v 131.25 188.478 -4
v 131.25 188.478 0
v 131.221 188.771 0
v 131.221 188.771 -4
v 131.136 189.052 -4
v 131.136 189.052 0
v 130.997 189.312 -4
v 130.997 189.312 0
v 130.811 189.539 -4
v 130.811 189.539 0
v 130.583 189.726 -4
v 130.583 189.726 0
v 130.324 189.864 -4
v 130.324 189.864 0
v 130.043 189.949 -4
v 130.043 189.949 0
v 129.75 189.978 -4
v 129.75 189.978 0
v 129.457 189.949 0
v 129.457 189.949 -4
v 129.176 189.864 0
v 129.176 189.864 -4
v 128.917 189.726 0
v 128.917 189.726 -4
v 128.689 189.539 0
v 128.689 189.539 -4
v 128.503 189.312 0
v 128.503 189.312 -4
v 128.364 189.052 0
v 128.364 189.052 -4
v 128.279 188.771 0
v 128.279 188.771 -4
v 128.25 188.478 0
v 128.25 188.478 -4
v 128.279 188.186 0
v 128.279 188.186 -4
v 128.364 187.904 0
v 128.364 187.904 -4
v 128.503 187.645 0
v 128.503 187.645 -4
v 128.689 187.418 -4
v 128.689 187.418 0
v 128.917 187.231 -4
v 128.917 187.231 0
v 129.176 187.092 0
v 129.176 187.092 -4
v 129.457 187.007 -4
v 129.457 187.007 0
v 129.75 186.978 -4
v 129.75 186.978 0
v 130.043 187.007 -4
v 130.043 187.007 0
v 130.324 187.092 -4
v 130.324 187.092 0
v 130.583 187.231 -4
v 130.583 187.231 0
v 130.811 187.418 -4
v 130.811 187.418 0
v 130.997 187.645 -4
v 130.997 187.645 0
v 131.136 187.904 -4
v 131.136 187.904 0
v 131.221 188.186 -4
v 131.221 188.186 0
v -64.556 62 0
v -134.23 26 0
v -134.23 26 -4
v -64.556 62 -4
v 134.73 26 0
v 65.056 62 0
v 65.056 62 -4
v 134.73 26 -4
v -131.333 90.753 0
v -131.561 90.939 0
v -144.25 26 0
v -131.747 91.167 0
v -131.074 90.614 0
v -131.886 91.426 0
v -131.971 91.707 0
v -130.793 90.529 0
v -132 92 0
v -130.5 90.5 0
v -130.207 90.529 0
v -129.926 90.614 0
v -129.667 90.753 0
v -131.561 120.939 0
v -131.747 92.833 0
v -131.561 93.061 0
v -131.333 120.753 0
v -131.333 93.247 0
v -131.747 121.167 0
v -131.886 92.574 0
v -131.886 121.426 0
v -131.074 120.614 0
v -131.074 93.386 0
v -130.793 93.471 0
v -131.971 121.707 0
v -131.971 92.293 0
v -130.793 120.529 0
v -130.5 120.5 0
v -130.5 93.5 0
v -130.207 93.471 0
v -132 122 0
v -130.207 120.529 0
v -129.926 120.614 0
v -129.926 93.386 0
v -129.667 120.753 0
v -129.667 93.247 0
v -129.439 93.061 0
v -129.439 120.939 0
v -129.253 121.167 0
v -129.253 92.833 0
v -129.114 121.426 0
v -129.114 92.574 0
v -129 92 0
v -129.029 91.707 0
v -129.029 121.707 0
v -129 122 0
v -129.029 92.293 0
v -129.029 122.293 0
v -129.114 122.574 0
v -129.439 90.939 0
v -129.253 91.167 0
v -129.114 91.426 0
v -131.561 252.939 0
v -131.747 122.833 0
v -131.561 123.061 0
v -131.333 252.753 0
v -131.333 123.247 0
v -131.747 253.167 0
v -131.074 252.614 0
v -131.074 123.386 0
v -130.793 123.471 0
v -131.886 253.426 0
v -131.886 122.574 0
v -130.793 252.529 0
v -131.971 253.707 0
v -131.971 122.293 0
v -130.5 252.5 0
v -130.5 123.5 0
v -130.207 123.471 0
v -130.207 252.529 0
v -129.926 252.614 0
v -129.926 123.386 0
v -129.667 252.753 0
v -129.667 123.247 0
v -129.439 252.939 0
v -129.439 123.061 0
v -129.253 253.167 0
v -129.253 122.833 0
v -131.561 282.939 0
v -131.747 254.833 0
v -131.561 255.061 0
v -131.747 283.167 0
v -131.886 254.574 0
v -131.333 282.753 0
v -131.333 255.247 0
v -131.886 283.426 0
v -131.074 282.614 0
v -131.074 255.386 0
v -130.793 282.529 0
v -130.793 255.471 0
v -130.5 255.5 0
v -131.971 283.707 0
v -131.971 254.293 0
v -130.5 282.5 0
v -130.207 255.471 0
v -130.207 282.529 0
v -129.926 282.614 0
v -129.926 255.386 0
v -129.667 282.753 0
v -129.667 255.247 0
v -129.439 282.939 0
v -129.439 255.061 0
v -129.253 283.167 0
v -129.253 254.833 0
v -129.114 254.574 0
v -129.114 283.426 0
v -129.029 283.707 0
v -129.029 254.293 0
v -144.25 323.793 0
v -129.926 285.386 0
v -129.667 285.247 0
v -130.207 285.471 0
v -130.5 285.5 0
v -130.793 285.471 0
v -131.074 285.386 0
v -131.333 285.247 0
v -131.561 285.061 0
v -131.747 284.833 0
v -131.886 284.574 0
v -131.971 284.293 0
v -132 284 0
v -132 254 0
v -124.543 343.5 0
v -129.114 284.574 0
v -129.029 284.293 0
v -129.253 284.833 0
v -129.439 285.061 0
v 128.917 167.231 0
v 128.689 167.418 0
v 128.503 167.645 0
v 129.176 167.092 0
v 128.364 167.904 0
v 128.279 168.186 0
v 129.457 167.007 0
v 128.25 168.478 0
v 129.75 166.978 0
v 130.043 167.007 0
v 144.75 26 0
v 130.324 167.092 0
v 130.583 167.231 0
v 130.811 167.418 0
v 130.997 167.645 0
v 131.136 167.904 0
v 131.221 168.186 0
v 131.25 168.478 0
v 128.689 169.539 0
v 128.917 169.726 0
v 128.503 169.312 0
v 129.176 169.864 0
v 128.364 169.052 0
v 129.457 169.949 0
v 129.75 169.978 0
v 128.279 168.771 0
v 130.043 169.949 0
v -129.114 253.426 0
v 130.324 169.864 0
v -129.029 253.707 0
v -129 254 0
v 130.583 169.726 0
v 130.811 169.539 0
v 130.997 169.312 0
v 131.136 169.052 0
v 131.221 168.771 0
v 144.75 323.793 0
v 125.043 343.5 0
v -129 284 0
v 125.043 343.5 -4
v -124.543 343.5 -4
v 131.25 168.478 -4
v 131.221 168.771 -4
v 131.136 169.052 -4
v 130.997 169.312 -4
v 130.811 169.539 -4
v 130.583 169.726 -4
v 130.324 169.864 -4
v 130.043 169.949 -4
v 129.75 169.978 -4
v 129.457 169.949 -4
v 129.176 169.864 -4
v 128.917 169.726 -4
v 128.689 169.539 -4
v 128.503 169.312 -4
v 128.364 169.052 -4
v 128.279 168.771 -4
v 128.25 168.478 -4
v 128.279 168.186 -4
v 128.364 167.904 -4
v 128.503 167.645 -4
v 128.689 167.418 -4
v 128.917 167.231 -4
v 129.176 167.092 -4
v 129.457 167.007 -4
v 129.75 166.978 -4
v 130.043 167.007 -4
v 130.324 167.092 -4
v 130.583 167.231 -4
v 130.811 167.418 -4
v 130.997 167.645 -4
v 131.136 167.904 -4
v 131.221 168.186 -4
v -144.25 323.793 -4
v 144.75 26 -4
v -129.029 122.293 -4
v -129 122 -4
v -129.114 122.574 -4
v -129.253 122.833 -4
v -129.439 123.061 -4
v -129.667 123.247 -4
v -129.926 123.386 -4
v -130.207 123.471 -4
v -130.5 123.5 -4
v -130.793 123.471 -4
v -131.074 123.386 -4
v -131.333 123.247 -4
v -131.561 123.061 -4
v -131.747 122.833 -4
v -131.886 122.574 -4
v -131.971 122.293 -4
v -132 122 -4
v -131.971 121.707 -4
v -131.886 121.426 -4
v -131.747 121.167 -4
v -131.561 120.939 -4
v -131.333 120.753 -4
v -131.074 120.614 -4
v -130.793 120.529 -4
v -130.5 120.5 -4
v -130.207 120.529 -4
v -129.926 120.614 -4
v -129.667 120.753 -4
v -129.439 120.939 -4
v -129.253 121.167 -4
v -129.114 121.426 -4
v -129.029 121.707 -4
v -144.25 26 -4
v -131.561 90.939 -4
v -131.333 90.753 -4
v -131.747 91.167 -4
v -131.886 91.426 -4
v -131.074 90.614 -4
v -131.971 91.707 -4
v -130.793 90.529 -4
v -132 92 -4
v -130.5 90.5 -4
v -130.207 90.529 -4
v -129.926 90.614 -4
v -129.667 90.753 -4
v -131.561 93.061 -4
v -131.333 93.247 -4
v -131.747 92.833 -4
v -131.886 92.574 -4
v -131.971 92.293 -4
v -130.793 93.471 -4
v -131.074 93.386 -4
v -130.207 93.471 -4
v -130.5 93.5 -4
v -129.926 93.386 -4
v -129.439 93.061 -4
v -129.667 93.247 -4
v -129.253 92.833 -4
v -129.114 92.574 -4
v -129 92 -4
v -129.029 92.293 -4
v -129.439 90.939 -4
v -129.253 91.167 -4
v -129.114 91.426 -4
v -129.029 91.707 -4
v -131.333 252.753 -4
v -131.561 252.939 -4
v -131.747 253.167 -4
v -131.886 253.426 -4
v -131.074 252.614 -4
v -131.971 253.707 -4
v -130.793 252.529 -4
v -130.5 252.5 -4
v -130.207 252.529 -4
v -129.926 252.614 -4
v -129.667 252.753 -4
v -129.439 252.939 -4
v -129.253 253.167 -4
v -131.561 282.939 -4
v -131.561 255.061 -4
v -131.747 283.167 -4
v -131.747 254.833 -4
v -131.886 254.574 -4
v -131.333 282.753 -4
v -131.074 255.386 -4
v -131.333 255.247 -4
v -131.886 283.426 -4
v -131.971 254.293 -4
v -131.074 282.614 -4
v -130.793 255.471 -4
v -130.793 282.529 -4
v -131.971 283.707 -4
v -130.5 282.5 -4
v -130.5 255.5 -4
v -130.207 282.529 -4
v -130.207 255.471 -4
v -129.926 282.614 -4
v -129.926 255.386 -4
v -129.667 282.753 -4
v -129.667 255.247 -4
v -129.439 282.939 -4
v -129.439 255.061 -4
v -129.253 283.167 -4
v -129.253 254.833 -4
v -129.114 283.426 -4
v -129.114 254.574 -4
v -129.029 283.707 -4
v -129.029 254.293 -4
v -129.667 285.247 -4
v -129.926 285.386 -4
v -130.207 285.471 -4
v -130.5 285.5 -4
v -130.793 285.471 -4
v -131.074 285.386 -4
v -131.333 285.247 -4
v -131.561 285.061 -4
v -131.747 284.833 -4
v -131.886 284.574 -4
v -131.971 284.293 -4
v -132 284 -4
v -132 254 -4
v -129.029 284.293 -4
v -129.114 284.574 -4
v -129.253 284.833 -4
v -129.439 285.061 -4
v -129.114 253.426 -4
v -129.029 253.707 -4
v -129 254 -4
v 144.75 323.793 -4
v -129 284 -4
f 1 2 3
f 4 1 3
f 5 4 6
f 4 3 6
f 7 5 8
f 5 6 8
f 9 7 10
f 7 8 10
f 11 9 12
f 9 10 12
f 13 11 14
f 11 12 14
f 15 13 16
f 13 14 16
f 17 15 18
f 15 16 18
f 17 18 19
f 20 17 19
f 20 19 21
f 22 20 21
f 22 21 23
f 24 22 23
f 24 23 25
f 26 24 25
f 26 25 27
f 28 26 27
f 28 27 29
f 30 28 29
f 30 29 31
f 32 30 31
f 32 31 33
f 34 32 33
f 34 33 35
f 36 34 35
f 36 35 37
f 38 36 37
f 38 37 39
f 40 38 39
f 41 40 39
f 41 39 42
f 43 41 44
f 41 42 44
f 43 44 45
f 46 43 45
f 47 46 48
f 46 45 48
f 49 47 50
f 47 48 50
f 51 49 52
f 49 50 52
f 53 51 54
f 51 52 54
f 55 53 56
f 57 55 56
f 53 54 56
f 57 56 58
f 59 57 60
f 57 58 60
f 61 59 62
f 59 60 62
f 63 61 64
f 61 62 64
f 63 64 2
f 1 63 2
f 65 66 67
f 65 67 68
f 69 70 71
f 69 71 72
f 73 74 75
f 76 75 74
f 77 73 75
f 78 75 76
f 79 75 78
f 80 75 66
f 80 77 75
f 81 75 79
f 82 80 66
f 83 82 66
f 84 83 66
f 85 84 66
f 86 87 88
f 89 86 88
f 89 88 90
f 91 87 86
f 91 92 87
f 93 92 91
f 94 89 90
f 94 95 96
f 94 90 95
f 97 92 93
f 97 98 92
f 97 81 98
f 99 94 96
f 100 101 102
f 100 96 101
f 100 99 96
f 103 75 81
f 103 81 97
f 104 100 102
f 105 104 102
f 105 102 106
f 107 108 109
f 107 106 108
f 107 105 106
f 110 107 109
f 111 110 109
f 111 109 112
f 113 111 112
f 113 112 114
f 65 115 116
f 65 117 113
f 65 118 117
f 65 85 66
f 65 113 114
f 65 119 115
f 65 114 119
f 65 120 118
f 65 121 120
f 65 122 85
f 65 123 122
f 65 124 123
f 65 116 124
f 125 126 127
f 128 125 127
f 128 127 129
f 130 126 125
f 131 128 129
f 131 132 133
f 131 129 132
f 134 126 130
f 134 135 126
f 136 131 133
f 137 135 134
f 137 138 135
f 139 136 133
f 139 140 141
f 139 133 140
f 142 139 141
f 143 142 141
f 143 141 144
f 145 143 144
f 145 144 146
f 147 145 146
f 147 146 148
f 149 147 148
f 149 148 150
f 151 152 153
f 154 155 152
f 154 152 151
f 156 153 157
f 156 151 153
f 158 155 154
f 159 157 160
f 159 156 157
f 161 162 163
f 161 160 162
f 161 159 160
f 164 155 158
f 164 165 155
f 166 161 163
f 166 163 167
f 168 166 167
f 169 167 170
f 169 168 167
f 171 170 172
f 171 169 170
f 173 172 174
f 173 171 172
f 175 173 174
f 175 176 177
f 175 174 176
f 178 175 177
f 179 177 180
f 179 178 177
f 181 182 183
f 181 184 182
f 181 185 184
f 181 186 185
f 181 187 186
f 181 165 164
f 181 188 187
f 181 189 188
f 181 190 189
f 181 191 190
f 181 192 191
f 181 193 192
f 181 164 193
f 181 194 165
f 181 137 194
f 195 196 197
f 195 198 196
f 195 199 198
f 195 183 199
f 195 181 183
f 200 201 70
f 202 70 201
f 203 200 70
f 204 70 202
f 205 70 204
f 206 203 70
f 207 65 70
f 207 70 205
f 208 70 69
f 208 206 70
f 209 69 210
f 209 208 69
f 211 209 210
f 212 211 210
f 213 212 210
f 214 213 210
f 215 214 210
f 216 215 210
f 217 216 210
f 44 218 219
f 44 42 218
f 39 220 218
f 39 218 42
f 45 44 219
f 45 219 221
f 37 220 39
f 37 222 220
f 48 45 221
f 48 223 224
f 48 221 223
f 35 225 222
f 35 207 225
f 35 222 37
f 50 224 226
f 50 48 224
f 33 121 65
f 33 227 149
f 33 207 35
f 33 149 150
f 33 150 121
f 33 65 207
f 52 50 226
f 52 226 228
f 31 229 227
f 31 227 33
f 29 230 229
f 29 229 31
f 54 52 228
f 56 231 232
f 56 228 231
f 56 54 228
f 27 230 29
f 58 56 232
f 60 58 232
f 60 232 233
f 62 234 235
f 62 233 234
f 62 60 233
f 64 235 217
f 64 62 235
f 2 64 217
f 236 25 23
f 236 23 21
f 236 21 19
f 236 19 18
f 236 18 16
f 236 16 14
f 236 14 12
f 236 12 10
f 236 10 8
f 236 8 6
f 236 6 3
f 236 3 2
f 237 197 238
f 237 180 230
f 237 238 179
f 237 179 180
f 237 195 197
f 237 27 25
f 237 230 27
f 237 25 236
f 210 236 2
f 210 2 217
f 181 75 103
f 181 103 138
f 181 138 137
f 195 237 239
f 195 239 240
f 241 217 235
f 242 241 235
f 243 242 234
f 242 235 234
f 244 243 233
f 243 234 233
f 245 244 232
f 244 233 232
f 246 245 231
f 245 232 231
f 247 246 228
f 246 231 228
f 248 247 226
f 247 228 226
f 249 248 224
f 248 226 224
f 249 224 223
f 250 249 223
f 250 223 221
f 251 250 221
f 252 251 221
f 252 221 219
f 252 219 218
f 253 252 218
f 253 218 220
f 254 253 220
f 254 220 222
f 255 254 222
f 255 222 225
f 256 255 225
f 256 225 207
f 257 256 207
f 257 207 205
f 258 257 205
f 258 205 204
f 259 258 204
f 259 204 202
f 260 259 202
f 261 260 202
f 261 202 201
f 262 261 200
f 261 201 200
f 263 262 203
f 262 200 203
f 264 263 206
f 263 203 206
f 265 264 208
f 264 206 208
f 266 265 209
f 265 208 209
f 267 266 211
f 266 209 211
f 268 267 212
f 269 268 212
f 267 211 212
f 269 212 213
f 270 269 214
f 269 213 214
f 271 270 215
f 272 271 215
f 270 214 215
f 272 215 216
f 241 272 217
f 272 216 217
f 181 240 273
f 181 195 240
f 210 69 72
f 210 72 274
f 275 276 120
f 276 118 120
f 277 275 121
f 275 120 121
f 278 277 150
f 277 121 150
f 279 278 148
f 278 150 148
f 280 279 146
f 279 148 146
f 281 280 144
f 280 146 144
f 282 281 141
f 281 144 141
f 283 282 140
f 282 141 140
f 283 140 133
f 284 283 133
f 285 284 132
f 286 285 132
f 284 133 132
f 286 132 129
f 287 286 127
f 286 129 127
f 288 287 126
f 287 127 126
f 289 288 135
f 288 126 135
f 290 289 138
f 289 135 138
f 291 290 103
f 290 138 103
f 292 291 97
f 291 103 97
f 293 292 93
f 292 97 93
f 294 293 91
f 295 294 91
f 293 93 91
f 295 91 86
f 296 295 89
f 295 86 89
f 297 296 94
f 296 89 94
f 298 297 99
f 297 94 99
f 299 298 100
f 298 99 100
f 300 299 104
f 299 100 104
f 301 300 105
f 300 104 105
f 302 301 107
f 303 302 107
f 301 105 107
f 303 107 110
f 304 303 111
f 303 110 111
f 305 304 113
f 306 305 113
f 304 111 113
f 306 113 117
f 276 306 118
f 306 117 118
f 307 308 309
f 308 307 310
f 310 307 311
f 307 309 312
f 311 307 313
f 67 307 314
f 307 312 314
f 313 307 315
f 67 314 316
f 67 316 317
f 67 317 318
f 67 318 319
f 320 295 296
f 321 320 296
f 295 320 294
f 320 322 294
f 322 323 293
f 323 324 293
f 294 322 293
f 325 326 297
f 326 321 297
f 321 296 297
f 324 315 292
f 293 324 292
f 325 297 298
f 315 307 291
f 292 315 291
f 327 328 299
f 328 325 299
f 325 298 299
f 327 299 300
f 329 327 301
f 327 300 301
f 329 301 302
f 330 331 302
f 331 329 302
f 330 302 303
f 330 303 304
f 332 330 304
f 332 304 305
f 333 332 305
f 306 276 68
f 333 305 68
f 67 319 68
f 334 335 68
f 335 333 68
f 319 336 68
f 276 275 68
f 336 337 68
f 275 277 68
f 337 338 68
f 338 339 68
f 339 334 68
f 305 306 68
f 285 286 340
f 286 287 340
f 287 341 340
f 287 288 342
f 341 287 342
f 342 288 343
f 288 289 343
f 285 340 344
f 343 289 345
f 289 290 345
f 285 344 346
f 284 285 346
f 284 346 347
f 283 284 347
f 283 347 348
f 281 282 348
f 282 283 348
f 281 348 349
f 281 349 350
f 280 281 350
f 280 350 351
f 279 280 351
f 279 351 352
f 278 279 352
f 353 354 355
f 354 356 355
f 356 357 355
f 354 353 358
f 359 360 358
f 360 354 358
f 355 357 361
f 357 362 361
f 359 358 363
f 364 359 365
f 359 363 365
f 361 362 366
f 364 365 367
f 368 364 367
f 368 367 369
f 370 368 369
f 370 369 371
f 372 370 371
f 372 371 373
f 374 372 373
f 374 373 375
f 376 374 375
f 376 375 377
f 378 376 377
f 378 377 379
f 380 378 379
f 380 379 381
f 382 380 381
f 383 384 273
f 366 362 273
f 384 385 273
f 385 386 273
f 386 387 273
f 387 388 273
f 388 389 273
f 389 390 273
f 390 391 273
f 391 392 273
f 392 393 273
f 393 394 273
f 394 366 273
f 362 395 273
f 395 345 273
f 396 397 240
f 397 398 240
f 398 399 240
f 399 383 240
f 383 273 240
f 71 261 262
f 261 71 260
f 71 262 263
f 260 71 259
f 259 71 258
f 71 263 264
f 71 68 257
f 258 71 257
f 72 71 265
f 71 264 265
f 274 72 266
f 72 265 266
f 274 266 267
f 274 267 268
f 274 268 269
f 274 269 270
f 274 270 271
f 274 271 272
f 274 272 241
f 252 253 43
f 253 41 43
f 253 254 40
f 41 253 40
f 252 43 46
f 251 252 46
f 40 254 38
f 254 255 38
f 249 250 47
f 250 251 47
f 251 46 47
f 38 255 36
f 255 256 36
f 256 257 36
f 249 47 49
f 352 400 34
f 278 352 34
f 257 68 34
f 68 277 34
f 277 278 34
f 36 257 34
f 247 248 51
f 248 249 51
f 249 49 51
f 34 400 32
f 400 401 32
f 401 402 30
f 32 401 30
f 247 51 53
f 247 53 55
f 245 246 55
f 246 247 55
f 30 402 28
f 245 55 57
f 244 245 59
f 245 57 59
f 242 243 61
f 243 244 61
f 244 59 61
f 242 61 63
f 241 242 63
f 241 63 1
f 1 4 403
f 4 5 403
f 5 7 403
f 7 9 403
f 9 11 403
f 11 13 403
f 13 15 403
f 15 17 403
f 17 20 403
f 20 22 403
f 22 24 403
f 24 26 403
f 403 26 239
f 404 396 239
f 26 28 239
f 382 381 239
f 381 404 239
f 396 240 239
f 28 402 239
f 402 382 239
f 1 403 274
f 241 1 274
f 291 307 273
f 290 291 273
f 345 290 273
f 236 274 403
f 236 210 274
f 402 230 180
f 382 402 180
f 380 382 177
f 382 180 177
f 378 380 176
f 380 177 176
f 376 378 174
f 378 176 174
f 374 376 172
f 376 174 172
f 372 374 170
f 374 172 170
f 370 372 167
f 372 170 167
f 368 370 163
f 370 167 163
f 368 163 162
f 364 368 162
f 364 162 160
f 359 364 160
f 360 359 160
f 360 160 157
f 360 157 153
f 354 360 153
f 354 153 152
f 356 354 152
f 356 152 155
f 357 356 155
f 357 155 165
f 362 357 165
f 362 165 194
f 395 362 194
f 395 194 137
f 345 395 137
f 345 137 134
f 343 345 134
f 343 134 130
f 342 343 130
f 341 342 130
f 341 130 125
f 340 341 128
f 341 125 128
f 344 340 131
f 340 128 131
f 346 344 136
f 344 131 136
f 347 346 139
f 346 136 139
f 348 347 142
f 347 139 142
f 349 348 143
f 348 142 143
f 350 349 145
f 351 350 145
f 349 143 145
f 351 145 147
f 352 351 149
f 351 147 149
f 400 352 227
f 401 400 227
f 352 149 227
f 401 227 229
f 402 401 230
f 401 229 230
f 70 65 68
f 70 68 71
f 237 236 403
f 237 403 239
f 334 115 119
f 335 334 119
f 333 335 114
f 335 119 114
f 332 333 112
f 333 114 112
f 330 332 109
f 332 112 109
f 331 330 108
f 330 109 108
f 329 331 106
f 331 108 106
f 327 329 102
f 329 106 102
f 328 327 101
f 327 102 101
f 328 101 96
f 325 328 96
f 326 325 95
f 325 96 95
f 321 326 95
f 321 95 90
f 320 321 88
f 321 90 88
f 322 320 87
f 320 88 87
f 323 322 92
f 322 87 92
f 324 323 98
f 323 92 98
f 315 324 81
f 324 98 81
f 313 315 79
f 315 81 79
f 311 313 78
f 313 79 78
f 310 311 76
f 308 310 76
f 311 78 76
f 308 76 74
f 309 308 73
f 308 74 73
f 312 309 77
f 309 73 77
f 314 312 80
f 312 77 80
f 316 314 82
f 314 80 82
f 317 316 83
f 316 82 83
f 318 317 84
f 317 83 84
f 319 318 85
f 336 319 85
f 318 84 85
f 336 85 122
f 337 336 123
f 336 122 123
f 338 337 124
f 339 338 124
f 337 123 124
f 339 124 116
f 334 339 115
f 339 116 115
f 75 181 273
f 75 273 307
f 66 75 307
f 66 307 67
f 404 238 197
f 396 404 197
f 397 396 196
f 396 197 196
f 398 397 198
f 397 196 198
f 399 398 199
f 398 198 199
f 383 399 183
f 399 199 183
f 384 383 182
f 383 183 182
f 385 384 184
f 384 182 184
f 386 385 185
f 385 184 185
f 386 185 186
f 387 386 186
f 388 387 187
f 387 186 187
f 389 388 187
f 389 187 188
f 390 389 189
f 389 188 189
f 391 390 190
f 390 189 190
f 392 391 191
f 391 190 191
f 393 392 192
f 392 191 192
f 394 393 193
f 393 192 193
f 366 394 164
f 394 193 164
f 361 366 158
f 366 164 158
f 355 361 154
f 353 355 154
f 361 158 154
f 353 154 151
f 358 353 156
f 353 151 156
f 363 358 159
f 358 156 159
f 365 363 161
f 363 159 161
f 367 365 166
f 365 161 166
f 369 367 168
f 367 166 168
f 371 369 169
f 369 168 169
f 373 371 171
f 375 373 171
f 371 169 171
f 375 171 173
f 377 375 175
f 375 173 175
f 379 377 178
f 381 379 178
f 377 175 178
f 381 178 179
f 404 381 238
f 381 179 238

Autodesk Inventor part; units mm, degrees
ref_plane "YZ Plane" through (0, 0, 0) normal (1, 0, 0) x (0, 1, 0)
ref_plane "XZ Plane" through (0, 0, 0) normal (0, 1, 0) x (-1, 0, 0)
ref_plane "XY Plane" through (0, 0, 0) normal (0, 0, 1) x (1, 0, 0)
sketch "Эскиз1" plane through (0, 0, 0) normal (0, 0, 1) x (1, 0, 0)
  line L0 (-194.75, 26) -> (-144.75, 26) projected
  line L1 (-144.75, 26) -> (-144.75, 324) projected
  line L2 (-144.75, 324) -> (-124.75, 344) projected
  line L3 (-124.75, 344) -> (125.25, 344) projected
  line L4 (125.25, 344) -> (145.25, 324) projected
  line L5 (145.25, 324) -> (145.25, 26) projected
  line L6 (145.25, 26) -> (195.25, 26) projected
  line L7 (195.25, 26) -> (195.25, 534) projected
  line L8 (195.25, 534) -> (-194.75, 534) projected
  line L9 (-194.75, 534) -> (-194.75, 26) projected
  circle A0 centre (1.25, 464) radius 20.6 projected
  circle A1 centre (179.75, 255) radius 2 projected
  circle A2 centre (-179.25, 79.5) radius 2 projected
  circle A3 centre (179.75, 40) radius 1.5 projected
  circle A4 centre (-179.25, 337) radius 1.5 projected
  circle A5 centre (-179.25, 40) radius 1.5 projected
  circle A6 centre (-179.25, 308) radius 2 projected
  circle A7 centre (179.75, 292) radius 2 projected
  circle A8 centre (-158.5, 122) radius 1.5 projected
  circle A9 centre (-158.5, 254) radius 1.5 projected
  circle A10 centre (-158.5, 284) radius 1.5 projected
  circle A11 centre (-158.5, 92) radius 1.5 projected
  circle A12 centre (150.5171, 178.4783) radius 1.5 projected
  line L10 (-144.25, 26) -> (144.75, 26)
  line L11 (-124.5429, 343.5) -> (-144.25, 323.7929)
  line L12 (-144.25, 323.7929) -> (-144.25, 26)
  line L13 (-144.25, 25.5) -> (-195.25, 25.5)
  line L14 (-195.25, 25.5) -> (-195.25, 534.5)
  line L15 (-195.25, 534.5) -> (195.75, 534.5)
  line L16 (195.75, 534.5) -> (195.75, 25.5)
  line L17 (195.75, 25.5) -> (144.75, 25.5)
  line L18 (144.75, 26) -> (144.75, 323.7929)
  line L19 (144.75, 323.7929) -> (125.0429, 343.5)
  line L20 (125.0429, 343.5) -> (-124.5429, 343.5)
  circle A13 centre (-130.5, 284) radius 1.5 projected
  circle A14 centre (-130.5, 254) radius 1.5 projected
  circle A15 centre (-130.5, 122) radius 1.5 projected
  circle A16 centre (-130.5, 92) radius 1.5 projected
  dimension "d21" = 0.5
  dimension "d22" = 0.5
  dimension "d23" = 0.5
  dimension "d24" = 0.5
extrude "Выдавливание1" add sketch "Эскиз1" against normal blind 4 contours L12 L11 L20 L19 L18 L10
sketch "Эскиз2" plane through (0, 0, 0) normal (0, 0, 1) x (1, 0, 0)
  circle A0 centre (-130.5, 92) radius 1.5 projected
  circle A1 centre (-130.5, 122) radius 1.5 projected
  circle A2 centre (-130.5, 254) radius 1.5 projected
  circle A3 centre (-130.5, 284) radius 1.5 projected
  line L0 (-114.5429, 343.5) -> (-144.25, 313.7929) projected
  line L1 (-144.25, 313.7929) -> (-144.25, 43.1688) projected
  line L2 (-144.25, 43.1688) -> (-103.3546, -10.5) projected
  line L3 (-103.3546, -10.5) -> (103.8544, -10.5) projected
  line L4 (103.8544, -10.5) -> (144.75, 43.1637) projected
  line L5 (144.75, 43.1637) -> (144.75, 313.7929) projected
  line L6 (144.75, 313.7929) -> (115.0429, 343.5) projected
  line L7 (115.0429, 343.5) -> (-114.5429, 343.5) projected
  line L8 (144.75, 43.1637) -> (144.75, 313.7929) projected
  line L9 (144.75, 178.4783) -> (129.75, 178.4783)
  line L10 (129.75, 178.4783) -> (129.75, 188.4783)
  circle A4 centre (129.75, 188.4783) radius 1.5
  circle A5 centre (129.75, 168.4783) radius 1.5
  point P0 (0, 0)
  dimension "d7" = 3
  dimension "d8" = 3
  dimension "d9" = 10
  dimension "d10" = 20
  dimension "d11" = 15
extrude "Выдавливание2" cut sketch "Эскиз2" against normal blind 10 contours A4 | A5
sketch "Эскиз4" plane through (0, 0, 0) normal (0, 0, 1) x (1, 0, 0)
  line L0 (-106.1226, 31) -> (-137.405, 31) projected
  line L1 (137.905, 31) -> (106.6226, 31) projected
  line L2 (-103.3546, -10.5) -> (-144.25, 43.1688) projected
  line L3 (-134.9774, 31) -> (135.4804, 31)
  line L4 (144.75, 43.1637) -> (103.8544, -10.5) projected
  line L5 (-103.3546, -10.5) -> (103.8544, -10.5) projected
  line L6 (-134.9774, 31) -> (-103.3546, -10.5)
  line L7 (-103.3546, -10.5) -> (103.8544, -10.5)
  line L8 (103.8544, -10.5) -> (135.4804, 31)
  line L9 (-131.1675, 26) -> (131.67, 26)
  point P0 (0, 0)
  dimension "d16" = 0
  dimension "d19" = 12.1688
  dimension "d20" = 5
extrude "Выдавливание4" cut sketch "Эскиз4" against normal blind 5 contours L9 L4 L5 L2
sketch "Эскиз7" plane through (0, 0, 0) normal (0, 0, 1) x (1, 0, 0)
  line L0 (-131.9699, 31.6699) -> (-66.8244, 65.3301) construction
  line L1 (-64.0309, 66) -> (0.25, 66) construction
  line L2 (0.25, 65.3301) -> (57.2313, 65.3301) construction
  line L3 (59.4686, 65.3301) -> (67.3244, 65.3301) construction
  line L4 (67.3244, 65.3301) -> (132.4699, 31.6699) construction
  line L5 (144.9404, 31) -> (68.8214, 70.3301) construction
  line L6 (-144.4404, 31) -> (-68.3214, 70.3301) construction
  line L7 (0.25, 71) -> (-65.5279, 71) construction
  line L8 (66.0279, 71) -> (0.25, 71) construction
  line L9 (-144.25, 26) -> (144.75, 26) projected
  line L10 (-134.2295, 26) -> (-64.5556, 62)
  line L11 (-64.5556, 62) -> (65.0556, 62)
  line L12 (65.0556, 62) -> (134.7295, 26)
  line L13 (134.7295, 26) -> (-134.2295, 26)
  line L14 (-144.25, 323.7929) -> (-144.25, 26) projected
  line L15 (144.75, 323.7929) -> (144.75, 26) projected
  point P0 (0, 0)
  dimension "d32" = 4
  dimension "d33" = 4
  dimension "d34" = 4
extrude "Выдавливание6" cut sketch "Эскиз7" against normal blind 5
properties part number "дверька"
